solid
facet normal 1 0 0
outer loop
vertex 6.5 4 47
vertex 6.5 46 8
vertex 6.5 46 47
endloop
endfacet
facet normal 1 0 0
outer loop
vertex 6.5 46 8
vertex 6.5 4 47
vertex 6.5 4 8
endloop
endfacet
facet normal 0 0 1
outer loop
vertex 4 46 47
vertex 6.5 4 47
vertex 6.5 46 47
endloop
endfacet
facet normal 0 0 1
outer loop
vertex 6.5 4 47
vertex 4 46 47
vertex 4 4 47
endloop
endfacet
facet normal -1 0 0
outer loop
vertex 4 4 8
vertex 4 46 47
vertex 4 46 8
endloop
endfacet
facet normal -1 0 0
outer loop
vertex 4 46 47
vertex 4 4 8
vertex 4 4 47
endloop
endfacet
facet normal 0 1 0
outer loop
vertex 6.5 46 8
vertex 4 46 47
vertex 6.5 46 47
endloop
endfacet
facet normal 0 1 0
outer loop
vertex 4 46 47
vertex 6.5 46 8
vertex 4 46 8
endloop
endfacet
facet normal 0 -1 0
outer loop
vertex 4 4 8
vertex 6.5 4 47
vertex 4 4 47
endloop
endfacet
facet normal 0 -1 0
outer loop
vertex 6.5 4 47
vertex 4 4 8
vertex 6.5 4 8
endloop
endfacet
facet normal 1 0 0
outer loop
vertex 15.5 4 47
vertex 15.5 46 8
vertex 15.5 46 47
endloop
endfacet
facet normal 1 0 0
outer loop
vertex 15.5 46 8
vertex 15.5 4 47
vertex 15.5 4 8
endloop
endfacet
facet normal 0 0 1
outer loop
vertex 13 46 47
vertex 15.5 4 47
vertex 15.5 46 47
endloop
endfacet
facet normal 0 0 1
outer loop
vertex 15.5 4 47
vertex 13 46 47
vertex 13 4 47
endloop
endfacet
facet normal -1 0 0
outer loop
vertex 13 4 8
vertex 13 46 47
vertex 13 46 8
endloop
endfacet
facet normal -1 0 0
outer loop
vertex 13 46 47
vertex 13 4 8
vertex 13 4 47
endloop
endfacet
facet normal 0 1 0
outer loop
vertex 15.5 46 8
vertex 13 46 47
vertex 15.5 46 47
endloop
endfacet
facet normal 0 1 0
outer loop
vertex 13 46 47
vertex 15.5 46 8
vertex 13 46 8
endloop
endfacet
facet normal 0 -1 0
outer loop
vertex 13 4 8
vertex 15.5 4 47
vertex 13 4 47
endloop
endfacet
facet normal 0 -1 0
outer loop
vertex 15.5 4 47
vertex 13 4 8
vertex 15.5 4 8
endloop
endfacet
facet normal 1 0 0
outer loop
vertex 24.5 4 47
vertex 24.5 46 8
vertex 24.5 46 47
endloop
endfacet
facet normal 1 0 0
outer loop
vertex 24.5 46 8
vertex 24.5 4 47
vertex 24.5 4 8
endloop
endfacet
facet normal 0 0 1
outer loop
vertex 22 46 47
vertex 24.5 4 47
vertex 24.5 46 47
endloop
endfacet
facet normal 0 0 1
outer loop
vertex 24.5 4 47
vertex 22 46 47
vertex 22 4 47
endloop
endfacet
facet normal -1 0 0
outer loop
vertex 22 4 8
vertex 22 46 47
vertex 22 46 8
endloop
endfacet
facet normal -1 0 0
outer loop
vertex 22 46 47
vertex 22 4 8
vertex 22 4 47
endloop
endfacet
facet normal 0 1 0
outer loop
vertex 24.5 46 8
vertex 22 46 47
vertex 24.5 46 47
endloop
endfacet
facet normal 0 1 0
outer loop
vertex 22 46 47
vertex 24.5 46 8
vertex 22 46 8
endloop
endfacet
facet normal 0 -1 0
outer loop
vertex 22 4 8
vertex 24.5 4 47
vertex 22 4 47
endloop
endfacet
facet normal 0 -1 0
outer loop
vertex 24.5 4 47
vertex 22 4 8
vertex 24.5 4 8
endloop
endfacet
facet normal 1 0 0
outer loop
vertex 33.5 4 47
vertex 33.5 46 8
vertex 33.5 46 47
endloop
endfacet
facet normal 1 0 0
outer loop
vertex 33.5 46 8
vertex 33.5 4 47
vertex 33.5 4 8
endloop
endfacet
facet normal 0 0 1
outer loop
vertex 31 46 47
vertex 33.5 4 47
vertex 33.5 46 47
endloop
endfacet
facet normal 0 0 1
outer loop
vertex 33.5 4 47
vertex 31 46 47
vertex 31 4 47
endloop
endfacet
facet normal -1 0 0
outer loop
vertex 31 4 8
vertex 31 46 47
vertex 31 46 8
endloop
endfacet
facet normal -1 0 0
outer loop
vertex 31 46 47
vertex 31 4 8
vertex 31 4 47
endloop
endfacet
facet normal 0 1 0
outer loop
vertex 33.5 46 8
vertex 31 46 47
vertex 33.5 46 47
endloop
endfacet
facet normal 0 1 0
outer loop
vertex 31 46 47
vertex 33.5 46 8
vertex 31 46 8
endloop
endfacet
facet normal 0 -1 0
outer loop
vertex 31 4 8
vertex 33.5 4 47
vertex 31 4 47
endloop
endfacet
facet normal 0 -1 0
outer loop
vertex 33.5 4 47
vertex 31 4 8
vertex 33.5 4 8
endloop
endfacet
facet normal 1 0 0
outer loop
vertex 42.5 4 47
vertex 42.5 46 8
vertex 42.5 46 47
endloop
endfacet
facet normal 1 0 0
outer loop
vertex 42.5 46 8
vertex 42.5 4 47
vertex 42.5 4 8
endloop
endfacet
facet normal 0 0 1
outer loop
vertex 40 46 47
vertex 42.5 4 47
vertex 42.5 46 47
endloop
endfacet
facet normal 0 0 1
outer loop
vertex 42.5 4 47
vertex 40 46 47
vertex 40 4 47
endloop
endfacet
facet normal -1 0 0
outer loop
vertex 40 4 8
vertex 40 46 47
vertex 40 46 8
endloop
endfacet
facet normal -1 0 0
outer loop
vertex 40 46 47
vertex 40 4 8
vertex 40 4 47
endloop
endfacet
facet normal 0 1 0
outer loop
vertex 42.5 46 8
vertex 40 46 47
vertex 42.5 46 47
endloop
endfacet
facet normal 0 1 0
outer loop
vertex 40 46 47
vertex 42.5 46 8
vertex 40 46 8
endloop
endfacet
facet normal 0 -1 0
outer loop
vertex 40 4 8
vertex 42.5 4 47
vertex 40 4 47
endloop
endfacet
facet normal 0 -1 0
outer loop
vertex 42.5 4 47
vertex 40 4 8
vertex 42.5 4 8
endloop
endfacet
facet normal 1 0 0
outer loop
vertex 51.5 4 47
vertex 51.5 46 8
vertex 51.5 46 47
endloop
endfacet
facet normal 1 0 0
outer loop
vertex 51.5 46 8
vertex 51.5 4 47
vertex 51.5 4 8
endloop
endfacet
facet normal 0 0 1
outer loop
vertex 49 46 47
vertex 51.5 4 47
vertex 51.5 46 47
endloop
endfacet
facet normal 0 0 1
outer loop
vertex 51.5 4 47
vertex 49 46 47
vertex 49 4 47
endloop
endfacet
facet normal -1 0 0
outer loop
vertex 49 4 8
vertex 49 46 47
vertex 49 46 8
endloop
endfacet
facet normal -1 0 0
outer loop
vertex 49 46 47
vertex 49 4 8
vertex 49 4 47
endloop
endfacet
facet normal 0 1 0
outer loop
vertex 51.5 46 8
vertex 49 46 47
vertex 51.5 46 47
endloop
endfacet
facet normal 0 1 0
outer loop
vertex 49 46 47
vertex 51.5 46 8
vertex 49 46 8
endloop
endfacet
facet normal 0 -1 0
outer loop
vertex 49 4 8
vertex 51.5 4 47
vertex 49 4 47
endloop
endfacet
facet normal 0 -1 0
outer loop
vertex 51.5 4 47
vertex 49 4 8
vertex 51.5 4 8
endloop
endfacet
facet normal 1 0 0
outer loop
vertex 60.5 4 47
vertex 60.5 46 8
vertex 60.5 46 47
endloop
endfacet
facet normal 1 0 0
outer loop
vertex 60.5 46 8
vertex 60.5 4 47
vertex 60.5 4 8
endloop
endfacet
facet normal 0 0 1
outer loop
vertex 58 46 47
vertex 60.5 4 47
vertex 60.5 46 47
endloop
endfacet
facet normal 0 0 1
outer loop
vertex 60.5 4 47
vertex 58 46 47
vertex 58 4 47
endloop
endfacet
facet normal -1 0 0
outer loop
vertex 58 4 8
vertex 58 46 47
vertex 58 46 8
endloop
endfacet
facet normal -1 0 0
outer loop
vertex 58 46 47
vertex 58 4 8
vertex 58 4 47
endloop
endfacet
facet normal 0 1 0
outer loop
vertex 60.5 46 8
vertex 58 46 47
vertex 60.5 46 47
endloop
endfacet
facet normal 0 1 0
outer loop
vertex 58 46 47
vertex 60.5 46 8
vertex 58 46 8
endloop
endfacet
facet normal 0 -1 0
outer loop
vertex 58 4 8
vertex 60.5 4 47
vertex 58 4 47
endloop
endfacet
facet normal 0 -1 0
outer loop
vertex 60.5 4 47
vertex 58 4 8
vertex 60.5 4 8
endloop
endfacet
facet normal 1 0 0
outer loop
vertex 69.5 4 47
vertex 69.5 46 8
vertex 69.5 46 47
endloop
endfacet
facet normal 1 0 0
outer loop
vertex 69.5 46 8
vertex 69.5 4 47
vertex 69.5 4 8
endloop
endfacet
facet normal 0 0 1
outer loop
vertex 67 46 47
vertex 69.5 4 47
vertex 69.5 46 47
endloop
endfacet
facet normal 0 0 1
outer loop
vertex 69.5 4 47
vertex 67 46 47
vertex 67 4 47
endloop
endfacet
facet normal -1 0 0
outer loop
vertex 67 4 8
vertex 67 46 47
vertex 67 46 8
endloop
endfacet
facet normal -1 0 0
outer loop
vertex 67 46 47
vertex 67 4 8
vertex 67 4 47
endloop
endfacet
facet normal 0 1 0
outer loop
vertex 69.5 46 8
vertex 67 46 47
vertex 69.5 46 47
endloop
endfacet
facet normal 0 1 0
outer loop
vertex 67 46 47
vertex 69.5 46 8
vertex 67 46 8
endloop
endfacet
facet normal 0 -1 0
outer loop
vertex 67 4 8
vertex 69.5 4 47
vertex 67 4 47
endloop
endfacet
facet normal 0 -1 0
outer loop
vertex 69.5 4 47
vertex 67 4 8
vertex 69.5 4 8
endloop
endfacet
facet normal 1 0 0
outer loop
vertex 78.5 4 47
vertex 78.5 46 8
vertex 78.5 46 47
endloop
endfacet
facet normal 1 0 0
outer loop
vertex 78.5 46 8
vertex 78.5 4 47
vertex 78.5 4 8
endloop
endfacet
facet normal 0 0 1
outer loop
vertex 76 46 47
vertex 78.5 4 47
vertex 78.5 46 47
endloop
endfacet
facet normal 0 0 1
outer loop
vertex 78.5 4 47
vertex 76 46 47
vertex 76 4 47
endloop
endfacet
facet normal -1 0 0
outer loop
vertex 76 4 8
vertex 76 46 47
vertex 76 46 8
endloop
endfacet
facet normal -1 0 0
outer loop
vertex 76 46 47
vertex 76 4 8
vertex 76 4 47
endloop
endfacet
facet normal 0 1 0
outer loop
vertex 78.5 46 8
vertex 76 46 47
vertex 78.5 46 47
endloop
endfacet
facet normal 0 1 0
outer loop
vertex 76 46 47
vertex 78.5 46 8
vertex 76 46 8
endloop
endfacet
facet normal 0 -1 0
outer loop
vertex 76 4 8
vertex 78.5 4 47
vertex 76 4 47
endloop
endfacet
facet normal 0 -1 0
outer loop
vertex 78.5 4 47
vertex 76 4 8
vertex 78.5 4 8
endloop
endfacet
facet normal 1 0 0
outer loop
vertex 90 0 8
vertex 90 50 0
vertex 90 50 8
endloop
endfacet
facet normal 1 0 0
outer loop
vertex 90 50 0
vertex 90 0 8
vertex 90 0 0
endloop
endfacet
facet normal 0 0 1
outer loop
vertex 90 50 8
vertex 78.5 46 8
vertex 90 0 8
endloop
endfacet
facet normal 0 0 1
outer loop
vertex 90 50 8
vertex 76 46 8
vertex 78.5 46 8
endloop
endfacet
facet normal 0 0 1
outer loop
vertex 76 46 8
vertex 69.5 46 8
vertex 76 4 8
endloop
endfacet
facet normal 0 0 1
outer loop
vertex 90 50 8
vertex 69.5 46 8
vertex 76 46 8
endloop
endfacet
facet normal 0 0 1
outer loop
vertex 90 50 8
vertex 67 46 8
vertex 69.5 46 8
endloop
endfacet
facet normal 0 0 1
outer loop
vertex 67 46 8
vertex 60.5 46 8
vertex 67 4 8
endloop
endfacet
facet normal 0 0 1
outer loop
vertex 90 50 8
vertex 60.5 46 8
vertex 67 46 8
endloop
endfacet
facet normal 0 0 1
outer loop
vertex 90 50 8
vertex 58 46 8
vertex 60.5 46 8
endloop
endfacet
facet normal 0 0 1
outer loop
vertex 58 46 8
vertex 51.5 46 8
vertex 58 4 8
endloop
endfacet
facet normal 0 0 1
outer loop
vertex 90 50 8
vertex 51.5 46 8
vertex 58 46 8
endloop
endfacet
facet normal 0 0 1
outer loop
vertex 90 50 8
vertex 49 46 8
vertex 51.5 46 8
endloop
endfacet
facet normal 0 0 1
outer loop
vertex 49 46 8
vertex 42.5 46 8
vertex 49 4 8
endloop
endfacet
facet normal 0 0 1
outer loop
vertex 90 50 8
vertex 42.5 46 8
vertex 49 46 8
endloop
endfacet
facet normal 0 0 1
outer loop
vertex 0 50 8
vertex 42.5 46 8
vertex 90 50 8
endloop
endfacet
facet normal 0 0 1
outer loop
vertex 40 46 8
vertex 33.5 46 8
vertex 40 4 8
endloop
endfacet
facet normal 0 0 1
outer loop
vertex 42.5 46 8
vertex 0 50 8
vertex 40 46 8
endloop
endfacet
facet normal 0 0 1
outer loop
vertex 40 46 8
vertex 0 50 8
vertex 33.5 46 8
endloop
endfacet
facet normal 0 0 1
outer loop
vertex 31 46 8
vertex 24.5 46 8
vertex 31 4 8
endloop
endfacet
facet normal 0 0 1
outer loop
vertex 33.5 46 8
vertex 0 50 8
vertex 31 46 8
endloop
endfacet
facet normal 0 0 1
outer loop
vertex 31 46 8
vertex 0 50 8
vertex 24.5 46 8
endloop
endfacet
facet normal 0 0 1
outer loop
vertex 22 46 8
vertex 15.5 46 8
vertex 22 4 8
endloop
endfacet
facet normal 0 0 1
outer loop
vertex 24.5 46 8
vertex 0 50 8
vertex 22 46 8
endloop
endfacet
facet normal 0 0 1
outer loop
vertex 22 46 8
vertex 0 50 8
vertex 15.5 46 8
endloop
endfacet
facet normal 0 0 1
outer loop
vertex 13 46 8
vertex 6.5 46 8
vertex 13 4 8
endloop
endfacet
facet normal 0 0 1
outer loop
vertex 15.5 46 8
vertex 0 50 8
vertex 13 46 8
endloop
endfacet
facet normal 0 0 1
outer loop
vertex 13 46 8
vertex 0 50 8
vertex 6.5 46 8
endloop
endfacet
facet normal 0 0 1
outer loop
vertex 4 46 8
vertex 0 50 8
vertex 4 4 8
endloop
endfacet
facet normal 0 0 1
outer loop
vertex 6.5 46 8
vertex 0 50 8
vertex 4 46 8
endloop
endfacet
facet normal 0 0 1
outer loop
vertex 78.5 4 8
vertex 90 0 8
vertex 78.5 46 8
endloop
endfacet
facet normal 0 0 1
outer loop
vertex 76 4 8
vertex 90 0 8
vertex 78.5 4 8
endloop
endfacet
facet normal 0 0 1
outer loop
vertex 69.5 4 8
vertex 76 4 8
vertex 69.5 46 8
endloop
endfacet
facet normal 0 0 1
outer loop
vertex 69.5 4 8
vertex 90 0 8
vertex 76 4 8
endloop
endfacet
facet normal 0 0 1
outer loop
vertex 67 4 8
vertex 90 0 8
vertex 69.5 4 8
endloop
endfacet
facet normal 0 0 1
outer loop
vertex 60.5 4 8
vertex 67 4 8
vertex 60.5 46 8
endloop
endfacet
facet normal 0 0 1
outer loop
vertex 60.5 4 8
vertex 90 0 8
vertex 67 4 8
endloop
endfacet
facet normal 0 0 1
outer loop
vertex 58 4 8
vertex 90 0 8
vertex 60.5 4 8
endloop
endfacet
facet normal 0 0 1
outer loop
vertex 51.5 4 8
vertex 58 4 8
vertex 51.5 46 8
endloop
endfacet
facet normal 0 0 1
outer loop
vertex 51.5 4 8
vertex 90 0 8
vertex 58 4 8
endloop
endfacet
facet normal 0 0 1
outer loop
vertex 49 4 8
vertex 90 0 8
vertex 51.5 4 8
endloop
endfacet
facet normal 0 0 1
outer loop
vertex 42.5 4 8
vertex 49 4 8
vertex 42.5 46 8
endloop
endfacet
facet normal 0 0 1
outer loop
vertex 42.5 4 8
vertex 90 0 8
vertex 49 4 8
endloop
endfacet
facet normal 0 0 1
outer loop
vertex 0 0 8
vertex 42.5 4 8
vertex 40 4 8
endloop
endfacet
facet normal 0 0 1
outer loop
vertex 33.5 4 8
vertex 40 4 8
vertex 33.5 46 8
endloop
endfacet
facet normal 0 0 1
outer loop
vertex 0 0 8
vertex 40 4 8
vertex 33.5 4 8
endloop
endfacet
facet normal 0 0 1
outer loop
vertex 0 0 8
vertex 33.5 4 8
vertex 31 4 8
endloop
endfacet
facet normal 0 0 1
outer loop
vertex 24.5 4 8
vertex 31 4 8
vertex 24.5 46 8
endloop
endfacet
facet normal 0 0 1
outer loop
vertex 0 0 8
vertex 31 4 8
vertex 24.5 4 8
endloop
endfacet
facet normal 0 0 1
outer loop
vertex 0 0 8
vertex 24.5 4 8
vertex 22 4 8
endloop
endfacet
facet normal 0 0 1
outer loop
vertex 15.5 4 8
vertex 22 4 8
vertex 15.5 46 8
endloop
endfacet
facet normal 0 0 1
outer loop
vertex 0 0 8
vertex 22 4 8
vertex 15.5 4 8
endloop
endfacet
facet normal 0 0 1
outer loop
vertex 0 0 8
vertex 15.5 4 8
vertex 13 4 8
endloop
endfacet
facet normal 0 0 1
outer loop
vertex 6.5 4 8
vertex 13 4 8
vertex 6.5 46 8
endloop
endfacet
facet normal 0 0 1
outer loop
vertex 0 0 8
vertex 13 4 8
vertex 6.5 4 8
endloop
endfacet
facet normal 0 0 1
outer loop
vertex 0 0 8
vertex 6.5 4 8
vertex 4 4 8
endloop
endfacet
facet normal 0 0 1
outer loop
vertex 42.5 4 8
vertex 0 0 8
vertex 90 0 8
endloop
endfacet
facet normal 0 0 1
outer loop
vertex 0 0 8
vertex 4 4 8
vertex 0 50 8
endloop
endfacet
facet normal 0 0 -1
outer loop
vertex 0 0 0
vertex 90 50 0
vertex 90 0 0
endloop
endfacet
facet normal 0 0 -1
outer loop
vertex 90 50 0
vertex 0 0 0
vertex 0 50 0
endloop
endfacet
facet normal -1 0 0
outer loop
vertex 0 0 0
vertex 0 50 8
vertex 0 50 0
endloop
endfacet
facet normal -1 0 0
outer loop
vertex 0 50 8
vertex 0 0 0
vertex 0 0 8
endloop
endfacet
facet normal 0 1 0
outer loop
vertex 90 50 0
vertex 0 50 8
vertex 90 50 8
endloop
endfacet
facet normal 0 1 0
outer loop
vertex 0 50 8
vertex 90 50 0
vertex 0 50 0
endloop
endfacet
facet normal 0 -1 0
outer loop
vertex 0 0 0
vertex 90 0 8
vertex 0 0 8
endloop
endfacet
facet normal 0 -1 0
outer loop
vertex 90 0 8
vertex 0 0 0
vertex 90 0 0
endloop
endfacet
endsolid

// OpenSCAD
$fn = 32;

// ----------------------------------------------------------------------
// Heatsink: uniform fin block
// ----------------------------------------------------------------------

// --- parameters (mm) ---
base_l = 90;              // base length, X
base_w = 50;              // base width, Y
base_t = 8;               // base plate thickness
fin_h = 40;               // fin height above the base
fin_t = 2.5;              // fin thickness
edge = 4;                 // margin from the base ends
pitch = 9;                // fin pitch
fit_tol = 0.05;           // tolerance for press fits, mm
free_tol = 0.3;           // tolerance for clearance fits, mm

n_fins = floor((base_l - 2 * edge - fin_t) / pitch) + 1;  // fin count
total_h = base_t + fin_h - 1;  // overall height

union() {
  cube([base_l, base_w, base_t]);
  for (i = [0 : n_fins - 1])
    translate([edge + i * pitch, edge, base_t - 1])
      cube([fin_t, base_w - 2 * edge, fin_h]);
}
